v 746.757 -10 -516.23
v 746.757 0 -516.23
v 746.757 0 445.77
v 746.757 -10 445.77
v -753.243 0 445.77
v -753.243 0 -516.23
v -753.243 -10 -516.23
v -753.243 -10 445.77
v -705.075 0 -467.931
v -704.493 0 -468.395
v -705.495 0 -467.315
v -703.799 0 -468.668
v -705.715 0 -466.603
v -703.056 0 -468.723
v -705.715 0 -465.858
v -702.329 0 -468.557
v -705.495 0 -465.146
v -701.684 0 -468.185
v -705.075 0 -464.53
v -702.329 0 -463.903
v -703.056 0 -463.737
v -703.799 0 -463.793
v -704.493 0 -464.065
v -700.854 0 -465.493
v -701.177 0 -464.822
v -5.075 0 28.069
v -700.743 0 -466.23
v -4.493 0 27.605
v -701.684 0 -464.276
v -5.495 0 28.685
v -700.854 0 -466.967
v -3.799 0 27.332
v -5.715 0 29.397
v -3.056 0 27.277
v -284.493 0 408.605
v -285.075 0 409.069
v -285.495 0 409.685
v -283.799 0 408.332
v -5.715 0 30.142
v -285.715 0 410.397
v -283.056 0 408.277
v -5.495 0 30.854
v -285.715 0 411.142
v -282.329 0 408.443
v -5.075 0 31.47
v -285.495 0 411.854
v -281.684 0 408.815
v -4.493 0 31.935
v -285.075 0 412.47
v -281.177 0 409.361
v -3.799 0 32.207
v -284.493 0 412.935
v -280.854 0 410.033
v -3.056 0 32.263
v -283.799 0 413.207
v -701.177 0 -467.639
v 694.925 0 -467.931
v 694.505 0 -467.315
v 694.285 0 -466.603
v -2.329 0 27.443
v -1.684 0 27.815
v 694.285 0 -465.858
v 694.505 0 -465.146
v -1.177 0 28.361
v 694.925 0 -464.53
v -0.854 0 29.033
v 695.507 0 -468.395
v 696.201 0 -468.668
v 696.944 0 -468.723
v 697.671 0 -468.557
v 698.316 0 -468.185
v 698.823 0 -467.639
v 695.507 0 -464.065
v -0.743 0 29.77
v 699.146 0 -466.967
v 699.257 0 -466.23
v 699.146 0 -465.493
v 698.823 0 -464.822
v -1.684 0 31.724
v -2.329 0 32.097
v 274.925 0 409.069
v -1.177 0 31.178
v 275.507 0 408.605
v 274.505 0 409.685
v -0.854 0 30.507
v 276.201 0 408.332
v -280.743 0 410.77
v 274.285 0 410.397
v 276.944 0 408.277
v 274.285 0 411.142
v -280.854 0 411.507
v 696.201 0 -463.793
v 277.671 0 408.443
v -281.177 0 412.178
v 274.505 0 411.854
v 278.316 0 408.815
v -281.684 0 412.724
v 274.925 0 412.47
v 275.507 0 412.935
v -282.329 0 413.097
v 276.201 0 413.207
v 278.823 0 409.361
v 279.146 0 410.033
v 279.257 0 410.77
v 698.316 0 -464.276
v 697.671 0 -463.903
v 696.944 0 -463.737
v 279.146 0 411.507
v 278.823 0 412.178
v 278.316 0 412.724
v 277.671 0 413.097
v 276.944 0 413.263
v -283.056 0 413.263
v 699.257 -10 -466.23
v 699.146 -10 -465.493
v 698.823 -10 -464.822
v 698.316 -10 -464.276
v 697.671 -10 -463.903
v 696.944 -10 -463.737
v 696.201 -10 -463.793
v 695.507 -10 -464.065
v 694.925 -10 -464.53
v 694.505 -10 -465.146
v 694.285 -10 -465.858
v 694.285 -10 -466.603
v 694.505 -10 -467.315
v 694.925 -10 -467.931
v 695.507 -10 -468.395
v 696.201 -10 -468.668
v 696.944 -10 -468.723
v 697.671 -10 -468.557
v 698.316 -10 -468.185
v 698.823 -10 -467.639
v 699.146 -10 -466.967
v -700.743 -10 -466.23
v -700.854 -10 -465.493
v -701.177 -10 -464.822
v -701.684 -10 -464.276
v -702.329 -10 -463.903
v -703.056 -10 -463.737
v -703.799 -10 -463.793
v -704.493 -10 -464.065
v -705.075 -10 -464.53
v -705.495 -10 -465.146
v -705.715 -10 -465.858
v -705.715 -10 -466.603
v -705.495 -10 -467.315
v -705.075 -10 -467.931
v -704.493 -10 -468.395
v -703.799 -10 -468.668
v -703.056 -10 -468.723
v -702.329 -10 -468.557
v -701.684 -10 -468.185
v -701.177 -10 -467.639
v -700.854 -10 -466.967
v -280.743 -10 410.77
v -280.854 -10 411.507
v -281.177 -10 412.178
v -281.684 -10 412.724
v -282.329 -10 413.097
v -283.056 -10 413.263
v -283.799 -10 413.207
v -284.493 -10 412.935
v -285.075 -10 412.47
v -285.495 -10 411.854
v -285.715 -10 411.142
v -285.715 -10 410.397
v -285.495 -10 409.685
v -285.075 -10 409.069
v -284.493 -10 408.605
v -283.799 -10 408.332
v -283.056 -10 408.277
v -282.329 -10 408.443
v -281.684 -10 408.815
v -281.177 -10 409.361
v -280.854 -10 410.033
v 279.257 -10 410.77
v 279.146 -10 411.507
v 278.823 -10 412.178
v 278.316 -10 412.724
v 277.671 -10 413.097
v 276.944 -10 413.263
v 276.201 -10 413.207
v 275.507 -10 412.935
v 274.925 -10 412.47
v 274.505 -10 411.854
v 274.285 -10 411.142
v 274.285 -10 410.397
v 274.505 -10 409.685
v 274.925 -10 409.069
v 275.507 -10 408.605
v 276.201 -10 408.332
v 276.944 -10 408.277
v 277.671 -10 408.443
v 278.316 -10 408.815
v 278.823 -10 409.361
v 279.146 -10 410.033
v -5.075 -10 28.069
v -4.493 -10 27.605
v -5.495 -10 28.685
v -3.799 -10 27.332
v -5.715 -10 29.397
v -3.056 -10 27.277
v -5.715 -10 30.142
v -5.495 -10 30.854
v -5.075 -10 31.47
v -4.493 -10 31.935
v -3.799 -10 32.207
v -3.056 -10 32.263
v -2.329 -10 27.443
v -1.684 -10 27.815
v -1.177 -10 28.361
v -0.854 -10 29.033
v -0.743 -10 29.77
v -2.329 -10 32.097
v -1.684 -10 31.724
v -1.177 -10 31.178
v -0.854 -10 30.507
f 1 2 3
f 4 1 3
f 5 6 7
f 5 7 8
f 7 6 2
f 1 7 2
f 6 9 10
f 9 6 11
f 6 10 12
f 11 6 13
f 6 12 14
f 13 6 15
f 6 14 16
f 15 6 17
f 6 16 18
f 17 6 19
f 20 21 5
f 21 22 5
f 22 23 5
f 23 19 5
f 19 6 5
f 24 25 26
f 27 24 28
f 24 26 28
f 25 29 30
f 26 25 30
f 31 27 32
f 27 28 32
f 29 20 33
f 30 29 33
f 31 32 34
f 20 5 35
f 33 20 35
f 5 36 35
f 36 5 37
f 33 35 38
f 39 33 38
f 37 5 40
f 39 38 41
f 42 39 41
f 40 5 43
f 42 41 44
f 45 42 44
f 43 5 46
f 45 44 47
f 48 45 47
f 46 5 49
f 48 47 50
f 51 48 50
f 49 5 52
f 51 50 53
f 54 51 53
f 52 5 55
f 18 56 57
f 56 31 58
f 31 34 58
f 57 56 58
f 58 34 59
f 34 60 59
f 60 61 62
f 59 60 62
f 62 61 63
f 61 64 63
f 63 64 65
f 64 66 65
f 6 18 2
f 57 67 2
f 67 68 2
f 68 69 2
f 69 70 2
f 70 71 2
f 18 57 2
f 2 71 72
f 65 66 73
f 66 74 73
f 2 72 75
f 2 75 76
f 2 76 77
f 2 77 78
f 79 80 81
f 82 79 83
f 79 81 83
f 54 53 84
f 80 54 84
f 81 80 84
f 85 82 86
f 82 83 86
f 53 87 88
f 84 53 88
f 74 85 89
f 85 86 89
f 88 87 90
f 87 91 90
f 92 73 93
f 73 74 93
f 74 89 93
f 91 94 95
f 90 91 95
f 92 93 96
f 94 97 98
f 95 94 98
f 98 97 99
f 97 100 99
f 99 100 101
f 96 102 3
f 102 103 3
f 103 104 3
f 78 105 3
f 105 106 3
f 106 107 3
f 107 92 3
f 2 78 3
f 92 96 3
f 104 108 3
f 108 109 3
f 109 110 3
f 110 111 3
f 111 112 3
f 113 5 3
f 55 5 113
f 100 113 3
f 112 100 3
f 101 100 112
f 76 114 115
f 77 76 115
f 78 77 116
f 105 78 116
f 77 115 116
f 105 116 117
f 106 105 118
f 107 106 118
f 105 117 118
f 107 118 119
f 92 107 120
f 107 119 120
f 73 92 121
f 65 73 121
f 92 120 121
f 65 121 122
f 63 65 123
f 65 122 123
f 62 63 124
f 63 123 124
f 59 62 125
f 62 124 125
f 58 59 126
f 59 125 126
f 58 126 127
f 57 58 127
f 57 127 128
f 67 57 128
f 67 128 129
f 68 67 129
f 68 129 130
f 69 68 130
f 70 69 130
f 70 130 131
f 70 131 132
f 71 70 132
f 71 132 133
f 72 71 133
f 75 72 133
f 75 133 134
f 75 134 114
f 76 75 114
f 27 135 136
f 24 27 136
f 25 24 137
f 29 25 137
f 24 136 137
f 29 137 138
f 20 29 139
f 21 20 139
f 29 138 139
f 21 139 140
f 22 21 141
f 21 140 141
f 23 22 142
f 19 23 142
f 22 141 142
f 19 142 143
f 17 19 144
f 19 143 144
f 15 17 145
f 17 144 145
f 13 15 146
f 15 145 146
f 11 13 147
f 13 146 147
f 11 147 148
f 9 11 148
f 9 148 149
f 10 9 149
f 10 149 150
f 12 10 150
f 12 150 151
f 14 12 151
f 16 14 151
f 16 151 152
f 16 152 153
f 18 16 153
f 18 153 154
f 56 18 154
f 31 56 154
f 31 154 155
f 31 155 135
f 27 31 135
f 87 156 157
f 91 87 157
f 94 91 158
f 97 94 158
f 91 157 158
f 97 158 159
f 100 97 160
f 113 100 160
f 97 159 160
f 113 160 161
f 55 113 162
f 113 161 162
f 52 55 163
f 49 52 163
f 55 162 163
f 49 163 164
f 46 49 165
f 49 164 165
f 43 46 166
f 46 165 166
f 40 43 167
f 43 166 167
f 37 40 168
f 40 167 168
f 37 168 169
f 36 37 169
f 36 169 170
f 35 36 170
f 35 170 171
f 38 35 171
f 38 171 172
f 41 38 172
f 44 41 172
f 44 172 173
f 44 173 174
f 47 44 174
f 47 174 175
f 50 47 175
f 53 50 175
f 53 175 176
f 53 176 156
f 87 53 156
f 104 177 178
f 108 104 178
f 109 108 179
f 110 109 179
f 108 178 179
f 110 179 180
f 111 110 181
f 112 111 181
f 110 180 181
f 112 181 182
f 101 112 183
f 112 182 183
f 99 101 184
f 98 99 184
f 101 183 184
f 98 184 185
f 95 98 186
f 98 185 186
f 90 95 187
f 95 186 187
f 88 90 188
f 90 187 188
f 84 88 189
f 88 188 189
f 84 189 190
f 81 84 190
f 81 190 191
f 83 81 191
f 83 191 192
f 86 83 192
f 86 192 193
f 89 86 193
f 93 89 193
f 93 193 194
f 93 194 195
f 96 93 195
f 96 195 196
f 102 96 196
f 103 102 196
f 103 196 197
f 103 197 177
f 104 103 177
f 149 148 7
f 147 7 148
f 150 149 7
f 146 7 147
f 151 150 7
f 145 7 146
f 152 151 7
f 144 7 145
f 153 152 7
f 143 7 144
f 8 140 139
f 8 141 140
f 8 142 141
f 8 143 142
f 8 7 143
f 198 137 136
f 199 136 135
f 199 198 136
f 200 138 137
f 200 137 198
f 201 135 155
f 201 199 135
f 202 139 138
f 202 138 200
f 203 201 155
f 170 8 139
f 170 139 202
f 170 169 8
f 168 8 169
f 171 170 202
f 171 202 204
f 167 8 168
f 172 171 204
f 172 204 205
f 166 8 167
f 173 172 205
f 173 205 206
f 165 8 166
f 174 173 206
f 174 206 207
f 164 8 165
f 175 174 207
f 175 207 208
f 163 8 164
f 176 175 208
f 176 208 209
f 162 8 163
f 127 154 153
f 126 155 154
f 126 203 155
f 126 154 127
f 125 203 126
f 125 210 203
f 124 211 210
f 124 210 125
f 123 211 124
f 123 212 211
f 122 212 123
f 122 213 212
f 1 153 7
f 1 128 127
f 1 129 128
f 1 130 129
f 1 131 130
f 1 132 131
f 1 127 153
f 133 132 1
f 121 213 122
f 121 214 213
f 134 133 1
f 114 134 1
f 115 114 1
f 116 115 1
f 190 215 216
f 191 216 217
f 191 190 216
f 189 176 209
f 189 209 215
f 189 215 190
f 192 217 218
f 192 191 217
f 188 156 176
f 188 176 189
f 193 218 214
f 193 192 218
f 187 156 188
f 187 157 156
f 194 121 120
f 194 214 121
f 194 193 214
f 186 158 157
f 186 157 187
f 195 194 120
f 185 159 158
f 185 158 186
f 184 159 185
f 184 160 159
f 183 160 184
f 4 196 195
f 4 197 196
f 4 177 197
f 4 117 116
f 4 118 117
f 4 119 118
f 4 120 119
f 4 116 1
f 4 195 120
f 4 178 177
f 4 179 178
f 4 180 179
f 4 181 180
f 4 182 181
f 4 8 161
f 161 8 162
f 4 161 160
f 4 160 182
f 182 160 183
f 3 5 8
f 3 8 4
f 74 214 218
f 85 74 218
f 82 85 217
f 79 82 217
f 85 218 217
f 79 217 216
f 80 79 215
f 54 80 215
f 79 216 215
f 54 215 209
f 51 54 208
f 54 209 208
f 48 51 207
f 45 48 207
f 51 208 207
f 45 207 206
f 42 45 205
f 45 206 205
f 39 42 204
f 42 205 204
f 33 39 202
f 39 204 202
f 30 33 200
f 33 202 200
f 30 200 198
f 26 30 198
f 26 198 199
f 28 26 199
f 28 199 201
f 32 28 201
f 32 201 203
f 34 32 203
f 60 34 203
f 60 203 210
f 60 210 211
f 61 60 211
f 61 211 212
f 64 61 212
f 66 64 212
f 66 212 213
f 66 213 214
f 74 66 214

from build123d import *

# Parameters (mm, degrees)
F0_W     = 1500
F0_H     = 962
F1_DEPTH = 10
F2_R     = 2.5
F3_DEPTH = 10.001
F4_R     = 2.5
F5_DEPTH = 10.001
F6_R     = 2.5
F7_DEPTH = 10.001


with BuildPart() as f1:
    # F0 (on Front) → F1 (new body)
    with BuildSketch(Plane.XZ):
        with Locations((-3.242647, -35.230274)):
            Rectangle(F0_W, F0_H)
    extrude(amount=F1_DEPTH)

    # F2 (on face) → F3 (cut, through all)
    with BuildSketch(Plane.XZ.offset(10)):
        with Locations((-703.242647, -466.230274)):
            Circle(F2_R)
        with Locations((696.757353, -466.230274)):
            Circle(F2_R)
    extrude(amount=-F3_DEPTH, mode=Mode.SUBTRACT)

    # F4 (on face) → F5 (cut, through all)
    with BuildSketch(Plane.XZ.offset(10)):
        with Locations((-283.242647, 410.769726)):
            Circle(F4_R)
        with Locations((276.757353, 410.769726)):
            Circle(F4_R)
    extrude(amount=-F5_DEPTH, mode=Mode.SUBTRACT)

    # F6 (on face) → F7 (cut, through all)
    with BuildSketch(Plane.XZ.offset(10)):
        with Locations((-3.242647, 29.769726)):
            Circle(F6_R)
    extrude(amount=-F7_DEPTH, mode=Mode.SUBTRACT)


solid = f1.part
